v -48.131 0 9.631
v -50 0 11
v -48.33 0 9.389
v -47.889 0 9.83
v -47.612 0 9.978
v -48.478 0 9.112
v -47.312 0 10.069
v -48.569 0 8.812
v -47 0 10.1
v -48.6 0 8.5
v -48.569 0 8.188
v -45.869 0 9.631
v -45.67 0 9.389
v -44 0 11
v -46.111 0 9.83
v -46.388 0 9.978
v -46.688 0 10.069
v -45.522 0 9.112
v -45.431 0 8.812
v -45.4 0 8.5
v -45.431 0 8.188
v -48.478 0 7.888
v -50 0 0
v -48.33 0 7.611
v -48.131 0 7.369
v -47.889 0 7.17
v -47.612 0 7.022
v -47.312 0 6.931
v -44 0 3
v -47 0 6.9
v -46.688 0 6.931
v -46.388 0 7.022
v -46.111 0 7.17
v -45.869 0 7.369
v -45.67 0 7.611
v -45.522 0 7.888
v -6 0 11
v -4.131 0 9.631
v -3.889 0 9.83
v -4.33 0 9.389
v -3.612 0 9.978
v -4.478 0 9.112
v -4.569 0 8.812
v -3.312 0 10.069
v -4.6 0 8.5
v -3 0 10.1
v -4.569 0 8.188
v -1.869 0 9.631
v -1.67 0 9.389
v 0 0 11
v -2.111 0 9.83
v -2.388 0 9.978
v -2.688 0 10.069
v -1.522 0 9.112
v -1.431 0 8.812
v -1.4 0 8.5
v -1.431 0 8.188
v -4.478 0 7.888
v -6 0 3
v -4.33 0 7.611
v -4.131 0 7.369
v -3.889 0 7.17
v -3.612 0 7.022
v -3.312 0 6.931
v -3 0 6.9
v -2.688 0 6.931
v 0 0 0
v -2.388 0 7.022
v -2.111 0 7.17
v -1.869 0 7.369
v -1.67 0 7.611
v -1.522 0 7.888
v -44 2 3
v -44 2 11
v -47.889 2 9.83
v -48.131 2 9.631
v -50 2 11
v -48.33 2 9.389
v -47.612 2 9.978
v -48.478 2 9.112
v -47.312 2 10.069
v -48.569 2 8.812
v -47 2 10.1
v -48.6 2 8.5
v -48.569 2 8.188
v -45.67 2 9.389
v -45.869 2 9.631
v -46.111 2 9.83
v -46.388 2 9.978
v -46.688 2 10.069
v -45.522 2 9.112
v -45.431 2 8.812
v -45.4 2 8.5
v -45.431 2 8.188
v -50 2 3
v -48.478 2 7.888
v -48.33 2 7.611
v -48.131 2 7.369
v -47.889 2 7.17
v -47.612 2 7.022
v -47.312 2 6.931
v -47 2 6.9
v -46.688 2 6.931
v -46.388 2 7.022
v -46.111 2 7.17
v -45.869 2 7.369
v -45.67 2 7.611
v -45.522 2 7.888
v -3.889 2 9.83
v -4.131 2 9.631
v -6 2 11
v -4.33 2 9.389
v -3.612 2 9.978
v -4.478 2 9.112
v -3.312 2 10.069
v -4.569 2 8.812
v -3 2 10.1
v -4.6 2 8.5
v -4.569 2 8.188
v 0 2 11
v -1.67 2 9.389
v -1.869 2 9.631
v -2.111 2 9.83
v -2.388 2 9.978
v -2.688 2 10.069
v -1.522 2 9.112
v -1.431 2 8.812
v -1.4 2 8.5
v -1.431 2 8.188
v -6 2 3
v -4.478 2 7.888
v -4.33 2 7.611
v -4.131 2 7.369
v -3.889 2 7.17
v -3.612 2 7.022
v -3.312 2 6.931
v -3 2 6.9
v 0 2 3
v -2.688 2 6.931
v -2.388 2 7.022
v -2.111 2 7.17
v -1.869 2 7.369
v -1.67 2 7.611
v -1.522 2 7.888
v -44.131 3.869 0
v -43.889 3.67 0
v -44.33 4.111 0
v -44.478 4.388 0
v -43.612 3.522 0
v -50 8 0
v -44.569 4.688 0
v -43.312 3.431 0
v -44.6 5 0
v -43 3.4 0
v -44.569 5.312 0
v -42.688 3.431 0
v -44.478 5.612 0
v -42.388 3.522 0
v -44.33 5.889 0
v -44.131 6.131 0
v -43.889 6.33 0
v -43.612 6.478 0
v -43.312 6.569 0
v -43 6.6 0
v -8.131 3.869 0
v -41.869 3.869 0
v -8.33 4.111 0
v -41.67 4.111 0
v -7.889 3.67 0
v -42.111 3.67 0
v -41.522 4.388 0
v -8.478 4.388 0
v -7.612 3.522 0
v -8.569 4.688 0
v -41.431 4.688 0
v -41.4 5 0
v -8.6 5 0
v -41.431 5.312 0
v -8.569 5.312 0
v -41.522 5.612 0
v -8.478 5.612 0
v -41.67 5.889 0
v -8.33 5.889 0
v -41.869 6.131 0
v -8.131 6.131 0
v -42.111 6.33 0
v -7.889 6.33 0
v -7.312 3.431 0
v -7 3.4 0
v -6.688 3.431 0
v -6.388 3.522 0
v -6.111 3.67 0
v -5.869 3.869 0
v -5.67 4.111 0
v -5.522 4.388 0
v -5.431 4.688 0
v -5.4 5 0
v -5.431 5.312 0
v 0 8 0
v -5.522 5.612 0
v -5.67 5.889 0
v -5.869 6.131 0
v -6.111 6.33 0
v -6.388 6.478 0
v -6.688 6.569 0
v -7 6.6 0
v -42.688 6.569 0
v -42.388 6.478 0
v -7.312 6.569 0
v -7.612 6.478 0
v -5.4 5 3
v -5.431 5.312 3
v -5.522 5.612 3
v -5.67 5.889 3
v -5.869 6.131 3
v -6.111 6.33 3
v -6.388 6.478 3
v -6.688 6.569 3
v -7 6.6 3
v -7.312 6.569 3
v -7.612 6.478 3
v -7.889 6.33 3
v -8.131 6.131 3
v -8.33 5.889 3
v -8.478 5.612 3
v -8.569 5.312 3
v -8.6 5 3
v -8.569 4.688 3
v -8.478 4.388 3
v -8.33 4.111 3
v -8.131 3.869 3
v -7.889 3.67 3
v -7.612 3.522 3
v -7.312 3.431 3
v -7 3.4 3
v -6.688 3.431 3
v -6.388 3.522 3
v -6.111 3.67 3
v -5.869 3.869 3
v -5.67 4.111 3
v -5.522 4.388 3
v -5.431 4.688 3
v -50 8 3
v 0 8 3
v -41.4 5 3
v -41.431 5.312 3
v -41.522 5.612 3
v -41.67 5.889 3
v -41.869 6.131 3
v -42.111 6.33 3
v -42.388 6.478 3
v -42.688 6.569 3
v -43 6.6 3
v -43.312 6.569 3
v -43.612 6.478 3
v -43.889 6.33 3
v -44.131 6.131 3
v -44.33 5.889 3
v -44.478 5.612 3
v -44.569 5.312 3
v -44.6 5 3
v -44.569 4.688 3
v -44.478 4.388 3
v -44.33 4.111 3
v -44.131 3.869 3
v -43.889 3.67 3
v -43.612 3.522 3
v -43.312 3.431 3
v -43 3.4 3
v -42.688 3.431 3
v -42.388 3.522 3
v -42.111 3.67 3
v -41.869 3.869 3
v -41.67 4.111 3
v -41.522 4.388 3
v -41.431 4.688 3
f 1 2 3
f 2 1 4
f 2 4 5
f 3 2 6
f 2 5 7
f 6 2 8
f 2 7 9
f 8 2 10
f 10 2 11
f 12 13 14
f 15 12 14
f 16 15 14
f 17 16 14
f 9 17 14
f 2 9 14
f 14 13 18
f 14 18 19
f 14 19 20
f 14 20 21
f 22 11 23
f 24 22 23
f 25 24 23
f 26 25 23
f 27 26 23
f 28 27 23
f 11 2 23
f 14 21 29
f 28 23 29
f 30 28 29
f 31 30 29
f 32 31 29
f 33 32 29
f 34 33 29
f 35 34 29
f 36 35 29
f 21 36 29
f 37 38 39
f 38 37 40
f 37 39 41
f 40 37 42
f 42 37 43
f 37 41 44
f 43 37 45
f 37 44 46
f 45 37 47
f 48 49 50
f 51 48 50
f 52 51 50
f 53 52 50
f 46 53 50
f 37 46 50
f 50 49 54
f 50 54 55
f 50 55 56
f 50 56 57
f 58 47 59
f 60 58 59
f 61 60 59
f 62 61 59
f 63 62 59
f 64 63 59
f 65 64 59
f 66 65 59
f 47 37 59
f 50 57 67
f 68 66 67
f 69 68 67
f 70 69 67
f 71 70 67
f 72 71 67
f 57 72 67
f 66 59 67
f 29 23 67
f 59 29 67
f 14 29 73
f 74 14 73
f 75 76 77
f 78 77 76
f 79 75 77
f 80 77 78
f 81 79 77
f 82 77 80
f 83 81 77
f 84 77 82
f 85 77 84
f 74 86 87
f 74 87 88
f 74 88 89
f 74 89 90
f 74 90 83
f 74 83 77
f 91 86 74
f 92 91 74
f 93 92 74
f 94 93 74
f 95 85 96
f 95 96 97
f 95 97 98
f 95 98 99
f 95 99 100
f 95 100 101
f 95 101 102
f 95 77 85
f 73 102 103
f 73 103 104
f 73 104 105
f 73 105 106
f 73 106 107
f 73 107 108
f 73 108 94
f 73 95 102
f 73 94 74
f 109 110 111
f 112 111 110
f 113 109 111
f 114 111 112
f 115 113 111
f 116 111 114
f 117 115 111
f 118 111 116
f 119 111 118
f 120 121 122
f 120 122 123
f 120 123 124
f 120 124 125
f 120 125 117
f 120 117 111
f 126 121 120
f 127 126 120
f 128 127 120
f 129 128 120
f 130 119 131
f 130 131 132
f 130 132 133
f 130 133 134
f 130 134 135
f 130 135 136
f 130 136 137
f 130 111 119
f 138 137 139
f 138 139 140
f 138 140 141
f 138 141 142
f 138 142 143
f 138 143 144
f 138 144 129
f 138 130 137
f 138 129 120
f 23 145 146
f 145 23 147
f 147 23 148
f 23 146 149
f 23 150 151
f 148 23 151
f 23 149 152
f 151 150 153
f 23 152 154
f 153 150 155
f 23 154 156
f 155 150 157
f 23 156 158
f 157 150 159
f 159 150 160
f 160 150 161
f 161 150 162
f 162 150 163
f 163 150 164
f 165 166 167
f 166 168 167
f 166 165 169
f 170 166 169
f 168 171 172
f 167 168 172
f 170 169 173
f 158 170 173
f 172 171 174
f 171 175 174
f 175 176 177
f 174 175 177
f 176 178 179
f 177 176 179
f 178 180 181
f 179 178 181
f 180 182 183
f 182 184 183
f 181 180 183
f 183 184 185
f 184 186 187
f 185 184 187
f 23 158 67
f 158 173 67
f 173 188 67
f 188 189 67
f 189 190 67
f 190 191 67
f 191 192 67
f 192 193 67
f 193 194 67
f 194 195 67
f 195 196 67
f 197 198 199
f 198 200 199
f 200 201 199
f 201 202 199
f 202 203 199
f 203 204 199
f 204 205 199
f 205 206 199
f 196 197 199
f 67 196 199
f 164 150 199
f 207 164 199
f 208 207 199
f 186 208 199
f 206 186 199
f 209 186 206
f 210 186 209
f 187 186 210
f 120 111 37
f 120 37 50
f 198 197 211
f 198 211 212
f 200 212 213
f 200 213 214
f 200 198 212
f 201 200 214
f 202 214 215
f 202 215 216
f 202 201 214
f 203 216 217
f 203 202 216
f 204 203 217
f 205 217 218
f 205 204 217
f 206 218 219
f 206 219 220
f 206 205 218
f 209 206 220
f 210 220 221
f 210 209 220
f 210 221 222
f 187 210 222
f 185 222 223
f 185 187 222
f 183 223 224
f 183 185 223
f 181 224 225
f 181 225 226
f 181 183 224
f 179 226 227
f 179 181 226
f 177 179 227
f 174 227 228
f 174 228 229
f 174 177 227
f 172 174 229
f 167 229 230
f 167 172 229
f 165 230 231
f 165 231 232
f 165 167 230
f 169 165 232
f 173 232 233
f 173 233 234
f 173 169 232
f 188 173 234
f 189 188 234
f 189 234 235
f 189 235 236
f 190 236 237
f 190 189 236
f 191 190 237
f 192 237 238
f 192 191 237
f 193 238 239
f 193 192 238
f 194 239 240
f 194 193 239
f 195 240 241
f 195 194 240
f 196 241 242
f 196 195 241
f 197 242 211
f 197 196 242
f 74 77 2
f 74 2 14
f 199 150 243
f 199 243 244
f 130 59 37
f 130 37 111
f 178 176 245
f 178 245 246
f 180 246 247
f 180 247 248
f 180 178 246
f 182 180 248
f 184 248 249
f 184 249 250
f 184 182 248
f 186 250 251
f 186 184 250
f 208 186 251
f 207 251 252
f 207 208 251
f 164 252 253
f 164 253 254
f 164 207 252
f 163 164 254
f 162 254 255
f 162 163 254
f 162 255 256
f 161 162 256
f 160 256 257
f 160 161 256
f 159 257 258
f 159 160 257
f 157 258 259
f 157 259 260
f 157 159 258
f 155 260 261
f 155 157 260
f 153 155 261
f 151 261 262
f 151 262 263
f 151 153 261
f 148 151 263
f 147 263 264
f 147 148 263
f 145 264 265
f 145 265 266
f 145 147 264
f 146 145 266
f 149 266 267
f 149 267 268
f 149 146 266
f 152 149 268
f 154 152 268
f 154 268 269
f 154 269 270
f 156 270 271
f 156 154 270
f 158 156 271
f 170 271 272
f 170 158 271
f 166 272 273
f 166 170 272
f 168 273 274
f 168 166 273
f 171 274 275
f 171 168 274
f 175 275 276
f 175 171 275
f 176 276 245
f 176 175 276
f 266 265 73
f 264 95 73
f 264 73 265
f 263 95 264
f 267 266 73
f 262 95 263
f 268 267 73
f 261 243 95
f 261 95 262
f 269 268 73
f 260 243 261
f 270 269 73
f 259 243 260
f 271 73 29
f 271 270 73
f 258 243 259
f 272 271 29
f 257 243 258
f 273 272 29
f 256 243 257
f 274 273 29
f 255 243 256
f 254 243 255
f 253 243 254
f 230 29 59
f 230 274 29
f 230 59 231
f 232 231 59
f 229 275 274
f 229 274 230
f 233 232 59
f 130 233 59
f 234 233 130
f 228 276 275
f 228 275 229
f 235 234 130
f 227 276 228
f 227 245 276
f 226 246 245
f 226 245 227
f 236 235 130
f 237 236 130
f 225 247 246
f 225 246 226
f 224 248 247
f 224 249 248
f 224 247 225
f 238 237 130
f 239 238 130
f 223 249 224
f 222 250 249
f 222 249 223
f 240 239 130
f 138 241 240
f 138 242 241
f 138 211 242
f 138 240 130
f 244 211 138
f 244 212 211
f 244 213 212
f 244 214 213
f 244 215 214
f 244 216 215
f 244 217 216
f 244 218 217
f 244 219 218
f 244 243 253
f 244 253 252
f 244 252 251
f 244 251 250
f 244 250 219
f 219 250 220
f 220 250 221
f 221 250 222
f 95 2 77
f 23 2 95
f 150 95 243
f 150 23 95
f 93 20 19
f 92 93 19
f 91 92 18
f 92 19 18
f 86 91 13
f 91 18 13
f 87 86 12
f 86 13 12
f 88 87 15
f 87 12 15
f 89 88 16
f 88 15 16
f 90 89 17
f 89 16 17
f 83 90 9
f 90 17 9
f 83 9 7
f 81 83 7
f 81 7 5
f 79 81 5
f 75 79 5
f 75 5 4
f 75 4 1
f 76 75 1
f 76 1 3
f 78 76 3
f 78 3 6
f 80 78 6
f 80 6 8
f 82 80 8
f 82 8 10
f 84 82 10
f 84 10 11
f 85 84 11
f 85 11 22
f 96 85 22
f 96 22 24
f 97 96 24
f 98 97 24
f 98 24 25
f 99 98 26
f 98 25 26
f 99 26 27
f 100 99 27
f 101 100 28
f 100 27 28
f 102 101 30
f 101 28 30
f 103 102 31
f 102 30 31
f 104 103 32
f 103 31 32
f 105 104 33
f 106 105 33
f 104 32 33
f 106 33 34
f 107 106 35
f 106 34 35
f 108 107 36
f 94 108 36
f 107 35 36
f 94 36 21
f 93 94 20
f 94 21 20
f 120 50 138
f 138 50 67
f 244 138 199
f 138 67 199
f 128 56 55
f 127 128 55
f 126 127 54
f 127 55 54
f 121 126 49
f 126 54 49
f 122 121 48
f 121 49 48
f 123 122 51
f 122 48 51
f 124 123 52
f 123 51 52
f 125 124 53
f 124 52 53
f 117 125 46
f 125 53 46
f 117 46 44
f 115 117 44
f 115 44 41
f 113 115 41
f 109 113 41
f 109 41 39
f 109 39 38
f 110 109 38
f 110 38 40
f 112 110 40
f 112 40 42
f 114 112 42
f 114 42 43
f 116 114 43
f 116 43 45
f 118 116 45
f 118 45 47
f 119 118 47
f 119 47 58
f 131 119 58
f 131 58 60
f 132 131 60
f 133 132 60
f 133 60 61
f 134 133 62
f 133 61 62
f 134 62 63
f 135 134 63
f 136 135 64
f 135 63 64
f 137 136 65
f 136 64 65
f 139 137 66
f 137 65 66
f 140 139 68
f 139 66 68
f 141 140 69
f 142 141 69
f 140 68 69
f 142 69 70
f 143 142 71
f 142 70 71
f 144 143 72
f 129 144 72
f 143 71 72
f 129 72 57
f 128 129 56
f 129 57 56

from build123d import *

# Parameters (mm, degrees)
SKETCH_W     = 50
SKETCH_H     = 8
SKETCH_R     = 1.6
PAD_DEPTH    = 3
SKETCH001_W  = 6
SKETCH001_H  = 2
PAD001_DEPTH = 8
SKETCH002_R  = 1.6
POCKET_DEPTH = 5


with BuildPart() as part:
    # Sketch → Pad (new body)
    with BuildSketch(Plane.XY):
        with Locations((-25, 4)):
            Rectangle(SKETCH_W, SKETCH_H)
        with Locations((-43, 5)):
            Circle(SKETCH_R, mode=Mode.SUBTRACT)
        with Locations((-7, 5)):
            Circle(SKETCH_R, mode=Mode.SUBTRACT)
    extrude(amount=PAD_DEPTH)

    # Sketch001 (on Face8 of Pad) → Pad001 (join)
    with BuildSketch(Plane.XY.offset(3)):
        with Locations((-47, 1)):
            Rectangle(SKETCH001_W, SKETCH001_H)
        with Locations((-3, 1)):
            Rectangle(SKETCH001_W, SKETCH001_H)
    extrude(amount=PAD001_DEPTH)

    # Sketch002 (on Face1 of Pad001) → Pocket (cut)
    with BuildSketch(Plane.XZ):
        with Locations((-47, 8.5)):
            Circle(SKETCH002_R)
        with Locations((-3, 8.5)):
            Circle(SKETCH002_R)
    extrude(amount=-POCKET_DEPTH, mode=Mode.SUBTRACT)


solid = part.part
